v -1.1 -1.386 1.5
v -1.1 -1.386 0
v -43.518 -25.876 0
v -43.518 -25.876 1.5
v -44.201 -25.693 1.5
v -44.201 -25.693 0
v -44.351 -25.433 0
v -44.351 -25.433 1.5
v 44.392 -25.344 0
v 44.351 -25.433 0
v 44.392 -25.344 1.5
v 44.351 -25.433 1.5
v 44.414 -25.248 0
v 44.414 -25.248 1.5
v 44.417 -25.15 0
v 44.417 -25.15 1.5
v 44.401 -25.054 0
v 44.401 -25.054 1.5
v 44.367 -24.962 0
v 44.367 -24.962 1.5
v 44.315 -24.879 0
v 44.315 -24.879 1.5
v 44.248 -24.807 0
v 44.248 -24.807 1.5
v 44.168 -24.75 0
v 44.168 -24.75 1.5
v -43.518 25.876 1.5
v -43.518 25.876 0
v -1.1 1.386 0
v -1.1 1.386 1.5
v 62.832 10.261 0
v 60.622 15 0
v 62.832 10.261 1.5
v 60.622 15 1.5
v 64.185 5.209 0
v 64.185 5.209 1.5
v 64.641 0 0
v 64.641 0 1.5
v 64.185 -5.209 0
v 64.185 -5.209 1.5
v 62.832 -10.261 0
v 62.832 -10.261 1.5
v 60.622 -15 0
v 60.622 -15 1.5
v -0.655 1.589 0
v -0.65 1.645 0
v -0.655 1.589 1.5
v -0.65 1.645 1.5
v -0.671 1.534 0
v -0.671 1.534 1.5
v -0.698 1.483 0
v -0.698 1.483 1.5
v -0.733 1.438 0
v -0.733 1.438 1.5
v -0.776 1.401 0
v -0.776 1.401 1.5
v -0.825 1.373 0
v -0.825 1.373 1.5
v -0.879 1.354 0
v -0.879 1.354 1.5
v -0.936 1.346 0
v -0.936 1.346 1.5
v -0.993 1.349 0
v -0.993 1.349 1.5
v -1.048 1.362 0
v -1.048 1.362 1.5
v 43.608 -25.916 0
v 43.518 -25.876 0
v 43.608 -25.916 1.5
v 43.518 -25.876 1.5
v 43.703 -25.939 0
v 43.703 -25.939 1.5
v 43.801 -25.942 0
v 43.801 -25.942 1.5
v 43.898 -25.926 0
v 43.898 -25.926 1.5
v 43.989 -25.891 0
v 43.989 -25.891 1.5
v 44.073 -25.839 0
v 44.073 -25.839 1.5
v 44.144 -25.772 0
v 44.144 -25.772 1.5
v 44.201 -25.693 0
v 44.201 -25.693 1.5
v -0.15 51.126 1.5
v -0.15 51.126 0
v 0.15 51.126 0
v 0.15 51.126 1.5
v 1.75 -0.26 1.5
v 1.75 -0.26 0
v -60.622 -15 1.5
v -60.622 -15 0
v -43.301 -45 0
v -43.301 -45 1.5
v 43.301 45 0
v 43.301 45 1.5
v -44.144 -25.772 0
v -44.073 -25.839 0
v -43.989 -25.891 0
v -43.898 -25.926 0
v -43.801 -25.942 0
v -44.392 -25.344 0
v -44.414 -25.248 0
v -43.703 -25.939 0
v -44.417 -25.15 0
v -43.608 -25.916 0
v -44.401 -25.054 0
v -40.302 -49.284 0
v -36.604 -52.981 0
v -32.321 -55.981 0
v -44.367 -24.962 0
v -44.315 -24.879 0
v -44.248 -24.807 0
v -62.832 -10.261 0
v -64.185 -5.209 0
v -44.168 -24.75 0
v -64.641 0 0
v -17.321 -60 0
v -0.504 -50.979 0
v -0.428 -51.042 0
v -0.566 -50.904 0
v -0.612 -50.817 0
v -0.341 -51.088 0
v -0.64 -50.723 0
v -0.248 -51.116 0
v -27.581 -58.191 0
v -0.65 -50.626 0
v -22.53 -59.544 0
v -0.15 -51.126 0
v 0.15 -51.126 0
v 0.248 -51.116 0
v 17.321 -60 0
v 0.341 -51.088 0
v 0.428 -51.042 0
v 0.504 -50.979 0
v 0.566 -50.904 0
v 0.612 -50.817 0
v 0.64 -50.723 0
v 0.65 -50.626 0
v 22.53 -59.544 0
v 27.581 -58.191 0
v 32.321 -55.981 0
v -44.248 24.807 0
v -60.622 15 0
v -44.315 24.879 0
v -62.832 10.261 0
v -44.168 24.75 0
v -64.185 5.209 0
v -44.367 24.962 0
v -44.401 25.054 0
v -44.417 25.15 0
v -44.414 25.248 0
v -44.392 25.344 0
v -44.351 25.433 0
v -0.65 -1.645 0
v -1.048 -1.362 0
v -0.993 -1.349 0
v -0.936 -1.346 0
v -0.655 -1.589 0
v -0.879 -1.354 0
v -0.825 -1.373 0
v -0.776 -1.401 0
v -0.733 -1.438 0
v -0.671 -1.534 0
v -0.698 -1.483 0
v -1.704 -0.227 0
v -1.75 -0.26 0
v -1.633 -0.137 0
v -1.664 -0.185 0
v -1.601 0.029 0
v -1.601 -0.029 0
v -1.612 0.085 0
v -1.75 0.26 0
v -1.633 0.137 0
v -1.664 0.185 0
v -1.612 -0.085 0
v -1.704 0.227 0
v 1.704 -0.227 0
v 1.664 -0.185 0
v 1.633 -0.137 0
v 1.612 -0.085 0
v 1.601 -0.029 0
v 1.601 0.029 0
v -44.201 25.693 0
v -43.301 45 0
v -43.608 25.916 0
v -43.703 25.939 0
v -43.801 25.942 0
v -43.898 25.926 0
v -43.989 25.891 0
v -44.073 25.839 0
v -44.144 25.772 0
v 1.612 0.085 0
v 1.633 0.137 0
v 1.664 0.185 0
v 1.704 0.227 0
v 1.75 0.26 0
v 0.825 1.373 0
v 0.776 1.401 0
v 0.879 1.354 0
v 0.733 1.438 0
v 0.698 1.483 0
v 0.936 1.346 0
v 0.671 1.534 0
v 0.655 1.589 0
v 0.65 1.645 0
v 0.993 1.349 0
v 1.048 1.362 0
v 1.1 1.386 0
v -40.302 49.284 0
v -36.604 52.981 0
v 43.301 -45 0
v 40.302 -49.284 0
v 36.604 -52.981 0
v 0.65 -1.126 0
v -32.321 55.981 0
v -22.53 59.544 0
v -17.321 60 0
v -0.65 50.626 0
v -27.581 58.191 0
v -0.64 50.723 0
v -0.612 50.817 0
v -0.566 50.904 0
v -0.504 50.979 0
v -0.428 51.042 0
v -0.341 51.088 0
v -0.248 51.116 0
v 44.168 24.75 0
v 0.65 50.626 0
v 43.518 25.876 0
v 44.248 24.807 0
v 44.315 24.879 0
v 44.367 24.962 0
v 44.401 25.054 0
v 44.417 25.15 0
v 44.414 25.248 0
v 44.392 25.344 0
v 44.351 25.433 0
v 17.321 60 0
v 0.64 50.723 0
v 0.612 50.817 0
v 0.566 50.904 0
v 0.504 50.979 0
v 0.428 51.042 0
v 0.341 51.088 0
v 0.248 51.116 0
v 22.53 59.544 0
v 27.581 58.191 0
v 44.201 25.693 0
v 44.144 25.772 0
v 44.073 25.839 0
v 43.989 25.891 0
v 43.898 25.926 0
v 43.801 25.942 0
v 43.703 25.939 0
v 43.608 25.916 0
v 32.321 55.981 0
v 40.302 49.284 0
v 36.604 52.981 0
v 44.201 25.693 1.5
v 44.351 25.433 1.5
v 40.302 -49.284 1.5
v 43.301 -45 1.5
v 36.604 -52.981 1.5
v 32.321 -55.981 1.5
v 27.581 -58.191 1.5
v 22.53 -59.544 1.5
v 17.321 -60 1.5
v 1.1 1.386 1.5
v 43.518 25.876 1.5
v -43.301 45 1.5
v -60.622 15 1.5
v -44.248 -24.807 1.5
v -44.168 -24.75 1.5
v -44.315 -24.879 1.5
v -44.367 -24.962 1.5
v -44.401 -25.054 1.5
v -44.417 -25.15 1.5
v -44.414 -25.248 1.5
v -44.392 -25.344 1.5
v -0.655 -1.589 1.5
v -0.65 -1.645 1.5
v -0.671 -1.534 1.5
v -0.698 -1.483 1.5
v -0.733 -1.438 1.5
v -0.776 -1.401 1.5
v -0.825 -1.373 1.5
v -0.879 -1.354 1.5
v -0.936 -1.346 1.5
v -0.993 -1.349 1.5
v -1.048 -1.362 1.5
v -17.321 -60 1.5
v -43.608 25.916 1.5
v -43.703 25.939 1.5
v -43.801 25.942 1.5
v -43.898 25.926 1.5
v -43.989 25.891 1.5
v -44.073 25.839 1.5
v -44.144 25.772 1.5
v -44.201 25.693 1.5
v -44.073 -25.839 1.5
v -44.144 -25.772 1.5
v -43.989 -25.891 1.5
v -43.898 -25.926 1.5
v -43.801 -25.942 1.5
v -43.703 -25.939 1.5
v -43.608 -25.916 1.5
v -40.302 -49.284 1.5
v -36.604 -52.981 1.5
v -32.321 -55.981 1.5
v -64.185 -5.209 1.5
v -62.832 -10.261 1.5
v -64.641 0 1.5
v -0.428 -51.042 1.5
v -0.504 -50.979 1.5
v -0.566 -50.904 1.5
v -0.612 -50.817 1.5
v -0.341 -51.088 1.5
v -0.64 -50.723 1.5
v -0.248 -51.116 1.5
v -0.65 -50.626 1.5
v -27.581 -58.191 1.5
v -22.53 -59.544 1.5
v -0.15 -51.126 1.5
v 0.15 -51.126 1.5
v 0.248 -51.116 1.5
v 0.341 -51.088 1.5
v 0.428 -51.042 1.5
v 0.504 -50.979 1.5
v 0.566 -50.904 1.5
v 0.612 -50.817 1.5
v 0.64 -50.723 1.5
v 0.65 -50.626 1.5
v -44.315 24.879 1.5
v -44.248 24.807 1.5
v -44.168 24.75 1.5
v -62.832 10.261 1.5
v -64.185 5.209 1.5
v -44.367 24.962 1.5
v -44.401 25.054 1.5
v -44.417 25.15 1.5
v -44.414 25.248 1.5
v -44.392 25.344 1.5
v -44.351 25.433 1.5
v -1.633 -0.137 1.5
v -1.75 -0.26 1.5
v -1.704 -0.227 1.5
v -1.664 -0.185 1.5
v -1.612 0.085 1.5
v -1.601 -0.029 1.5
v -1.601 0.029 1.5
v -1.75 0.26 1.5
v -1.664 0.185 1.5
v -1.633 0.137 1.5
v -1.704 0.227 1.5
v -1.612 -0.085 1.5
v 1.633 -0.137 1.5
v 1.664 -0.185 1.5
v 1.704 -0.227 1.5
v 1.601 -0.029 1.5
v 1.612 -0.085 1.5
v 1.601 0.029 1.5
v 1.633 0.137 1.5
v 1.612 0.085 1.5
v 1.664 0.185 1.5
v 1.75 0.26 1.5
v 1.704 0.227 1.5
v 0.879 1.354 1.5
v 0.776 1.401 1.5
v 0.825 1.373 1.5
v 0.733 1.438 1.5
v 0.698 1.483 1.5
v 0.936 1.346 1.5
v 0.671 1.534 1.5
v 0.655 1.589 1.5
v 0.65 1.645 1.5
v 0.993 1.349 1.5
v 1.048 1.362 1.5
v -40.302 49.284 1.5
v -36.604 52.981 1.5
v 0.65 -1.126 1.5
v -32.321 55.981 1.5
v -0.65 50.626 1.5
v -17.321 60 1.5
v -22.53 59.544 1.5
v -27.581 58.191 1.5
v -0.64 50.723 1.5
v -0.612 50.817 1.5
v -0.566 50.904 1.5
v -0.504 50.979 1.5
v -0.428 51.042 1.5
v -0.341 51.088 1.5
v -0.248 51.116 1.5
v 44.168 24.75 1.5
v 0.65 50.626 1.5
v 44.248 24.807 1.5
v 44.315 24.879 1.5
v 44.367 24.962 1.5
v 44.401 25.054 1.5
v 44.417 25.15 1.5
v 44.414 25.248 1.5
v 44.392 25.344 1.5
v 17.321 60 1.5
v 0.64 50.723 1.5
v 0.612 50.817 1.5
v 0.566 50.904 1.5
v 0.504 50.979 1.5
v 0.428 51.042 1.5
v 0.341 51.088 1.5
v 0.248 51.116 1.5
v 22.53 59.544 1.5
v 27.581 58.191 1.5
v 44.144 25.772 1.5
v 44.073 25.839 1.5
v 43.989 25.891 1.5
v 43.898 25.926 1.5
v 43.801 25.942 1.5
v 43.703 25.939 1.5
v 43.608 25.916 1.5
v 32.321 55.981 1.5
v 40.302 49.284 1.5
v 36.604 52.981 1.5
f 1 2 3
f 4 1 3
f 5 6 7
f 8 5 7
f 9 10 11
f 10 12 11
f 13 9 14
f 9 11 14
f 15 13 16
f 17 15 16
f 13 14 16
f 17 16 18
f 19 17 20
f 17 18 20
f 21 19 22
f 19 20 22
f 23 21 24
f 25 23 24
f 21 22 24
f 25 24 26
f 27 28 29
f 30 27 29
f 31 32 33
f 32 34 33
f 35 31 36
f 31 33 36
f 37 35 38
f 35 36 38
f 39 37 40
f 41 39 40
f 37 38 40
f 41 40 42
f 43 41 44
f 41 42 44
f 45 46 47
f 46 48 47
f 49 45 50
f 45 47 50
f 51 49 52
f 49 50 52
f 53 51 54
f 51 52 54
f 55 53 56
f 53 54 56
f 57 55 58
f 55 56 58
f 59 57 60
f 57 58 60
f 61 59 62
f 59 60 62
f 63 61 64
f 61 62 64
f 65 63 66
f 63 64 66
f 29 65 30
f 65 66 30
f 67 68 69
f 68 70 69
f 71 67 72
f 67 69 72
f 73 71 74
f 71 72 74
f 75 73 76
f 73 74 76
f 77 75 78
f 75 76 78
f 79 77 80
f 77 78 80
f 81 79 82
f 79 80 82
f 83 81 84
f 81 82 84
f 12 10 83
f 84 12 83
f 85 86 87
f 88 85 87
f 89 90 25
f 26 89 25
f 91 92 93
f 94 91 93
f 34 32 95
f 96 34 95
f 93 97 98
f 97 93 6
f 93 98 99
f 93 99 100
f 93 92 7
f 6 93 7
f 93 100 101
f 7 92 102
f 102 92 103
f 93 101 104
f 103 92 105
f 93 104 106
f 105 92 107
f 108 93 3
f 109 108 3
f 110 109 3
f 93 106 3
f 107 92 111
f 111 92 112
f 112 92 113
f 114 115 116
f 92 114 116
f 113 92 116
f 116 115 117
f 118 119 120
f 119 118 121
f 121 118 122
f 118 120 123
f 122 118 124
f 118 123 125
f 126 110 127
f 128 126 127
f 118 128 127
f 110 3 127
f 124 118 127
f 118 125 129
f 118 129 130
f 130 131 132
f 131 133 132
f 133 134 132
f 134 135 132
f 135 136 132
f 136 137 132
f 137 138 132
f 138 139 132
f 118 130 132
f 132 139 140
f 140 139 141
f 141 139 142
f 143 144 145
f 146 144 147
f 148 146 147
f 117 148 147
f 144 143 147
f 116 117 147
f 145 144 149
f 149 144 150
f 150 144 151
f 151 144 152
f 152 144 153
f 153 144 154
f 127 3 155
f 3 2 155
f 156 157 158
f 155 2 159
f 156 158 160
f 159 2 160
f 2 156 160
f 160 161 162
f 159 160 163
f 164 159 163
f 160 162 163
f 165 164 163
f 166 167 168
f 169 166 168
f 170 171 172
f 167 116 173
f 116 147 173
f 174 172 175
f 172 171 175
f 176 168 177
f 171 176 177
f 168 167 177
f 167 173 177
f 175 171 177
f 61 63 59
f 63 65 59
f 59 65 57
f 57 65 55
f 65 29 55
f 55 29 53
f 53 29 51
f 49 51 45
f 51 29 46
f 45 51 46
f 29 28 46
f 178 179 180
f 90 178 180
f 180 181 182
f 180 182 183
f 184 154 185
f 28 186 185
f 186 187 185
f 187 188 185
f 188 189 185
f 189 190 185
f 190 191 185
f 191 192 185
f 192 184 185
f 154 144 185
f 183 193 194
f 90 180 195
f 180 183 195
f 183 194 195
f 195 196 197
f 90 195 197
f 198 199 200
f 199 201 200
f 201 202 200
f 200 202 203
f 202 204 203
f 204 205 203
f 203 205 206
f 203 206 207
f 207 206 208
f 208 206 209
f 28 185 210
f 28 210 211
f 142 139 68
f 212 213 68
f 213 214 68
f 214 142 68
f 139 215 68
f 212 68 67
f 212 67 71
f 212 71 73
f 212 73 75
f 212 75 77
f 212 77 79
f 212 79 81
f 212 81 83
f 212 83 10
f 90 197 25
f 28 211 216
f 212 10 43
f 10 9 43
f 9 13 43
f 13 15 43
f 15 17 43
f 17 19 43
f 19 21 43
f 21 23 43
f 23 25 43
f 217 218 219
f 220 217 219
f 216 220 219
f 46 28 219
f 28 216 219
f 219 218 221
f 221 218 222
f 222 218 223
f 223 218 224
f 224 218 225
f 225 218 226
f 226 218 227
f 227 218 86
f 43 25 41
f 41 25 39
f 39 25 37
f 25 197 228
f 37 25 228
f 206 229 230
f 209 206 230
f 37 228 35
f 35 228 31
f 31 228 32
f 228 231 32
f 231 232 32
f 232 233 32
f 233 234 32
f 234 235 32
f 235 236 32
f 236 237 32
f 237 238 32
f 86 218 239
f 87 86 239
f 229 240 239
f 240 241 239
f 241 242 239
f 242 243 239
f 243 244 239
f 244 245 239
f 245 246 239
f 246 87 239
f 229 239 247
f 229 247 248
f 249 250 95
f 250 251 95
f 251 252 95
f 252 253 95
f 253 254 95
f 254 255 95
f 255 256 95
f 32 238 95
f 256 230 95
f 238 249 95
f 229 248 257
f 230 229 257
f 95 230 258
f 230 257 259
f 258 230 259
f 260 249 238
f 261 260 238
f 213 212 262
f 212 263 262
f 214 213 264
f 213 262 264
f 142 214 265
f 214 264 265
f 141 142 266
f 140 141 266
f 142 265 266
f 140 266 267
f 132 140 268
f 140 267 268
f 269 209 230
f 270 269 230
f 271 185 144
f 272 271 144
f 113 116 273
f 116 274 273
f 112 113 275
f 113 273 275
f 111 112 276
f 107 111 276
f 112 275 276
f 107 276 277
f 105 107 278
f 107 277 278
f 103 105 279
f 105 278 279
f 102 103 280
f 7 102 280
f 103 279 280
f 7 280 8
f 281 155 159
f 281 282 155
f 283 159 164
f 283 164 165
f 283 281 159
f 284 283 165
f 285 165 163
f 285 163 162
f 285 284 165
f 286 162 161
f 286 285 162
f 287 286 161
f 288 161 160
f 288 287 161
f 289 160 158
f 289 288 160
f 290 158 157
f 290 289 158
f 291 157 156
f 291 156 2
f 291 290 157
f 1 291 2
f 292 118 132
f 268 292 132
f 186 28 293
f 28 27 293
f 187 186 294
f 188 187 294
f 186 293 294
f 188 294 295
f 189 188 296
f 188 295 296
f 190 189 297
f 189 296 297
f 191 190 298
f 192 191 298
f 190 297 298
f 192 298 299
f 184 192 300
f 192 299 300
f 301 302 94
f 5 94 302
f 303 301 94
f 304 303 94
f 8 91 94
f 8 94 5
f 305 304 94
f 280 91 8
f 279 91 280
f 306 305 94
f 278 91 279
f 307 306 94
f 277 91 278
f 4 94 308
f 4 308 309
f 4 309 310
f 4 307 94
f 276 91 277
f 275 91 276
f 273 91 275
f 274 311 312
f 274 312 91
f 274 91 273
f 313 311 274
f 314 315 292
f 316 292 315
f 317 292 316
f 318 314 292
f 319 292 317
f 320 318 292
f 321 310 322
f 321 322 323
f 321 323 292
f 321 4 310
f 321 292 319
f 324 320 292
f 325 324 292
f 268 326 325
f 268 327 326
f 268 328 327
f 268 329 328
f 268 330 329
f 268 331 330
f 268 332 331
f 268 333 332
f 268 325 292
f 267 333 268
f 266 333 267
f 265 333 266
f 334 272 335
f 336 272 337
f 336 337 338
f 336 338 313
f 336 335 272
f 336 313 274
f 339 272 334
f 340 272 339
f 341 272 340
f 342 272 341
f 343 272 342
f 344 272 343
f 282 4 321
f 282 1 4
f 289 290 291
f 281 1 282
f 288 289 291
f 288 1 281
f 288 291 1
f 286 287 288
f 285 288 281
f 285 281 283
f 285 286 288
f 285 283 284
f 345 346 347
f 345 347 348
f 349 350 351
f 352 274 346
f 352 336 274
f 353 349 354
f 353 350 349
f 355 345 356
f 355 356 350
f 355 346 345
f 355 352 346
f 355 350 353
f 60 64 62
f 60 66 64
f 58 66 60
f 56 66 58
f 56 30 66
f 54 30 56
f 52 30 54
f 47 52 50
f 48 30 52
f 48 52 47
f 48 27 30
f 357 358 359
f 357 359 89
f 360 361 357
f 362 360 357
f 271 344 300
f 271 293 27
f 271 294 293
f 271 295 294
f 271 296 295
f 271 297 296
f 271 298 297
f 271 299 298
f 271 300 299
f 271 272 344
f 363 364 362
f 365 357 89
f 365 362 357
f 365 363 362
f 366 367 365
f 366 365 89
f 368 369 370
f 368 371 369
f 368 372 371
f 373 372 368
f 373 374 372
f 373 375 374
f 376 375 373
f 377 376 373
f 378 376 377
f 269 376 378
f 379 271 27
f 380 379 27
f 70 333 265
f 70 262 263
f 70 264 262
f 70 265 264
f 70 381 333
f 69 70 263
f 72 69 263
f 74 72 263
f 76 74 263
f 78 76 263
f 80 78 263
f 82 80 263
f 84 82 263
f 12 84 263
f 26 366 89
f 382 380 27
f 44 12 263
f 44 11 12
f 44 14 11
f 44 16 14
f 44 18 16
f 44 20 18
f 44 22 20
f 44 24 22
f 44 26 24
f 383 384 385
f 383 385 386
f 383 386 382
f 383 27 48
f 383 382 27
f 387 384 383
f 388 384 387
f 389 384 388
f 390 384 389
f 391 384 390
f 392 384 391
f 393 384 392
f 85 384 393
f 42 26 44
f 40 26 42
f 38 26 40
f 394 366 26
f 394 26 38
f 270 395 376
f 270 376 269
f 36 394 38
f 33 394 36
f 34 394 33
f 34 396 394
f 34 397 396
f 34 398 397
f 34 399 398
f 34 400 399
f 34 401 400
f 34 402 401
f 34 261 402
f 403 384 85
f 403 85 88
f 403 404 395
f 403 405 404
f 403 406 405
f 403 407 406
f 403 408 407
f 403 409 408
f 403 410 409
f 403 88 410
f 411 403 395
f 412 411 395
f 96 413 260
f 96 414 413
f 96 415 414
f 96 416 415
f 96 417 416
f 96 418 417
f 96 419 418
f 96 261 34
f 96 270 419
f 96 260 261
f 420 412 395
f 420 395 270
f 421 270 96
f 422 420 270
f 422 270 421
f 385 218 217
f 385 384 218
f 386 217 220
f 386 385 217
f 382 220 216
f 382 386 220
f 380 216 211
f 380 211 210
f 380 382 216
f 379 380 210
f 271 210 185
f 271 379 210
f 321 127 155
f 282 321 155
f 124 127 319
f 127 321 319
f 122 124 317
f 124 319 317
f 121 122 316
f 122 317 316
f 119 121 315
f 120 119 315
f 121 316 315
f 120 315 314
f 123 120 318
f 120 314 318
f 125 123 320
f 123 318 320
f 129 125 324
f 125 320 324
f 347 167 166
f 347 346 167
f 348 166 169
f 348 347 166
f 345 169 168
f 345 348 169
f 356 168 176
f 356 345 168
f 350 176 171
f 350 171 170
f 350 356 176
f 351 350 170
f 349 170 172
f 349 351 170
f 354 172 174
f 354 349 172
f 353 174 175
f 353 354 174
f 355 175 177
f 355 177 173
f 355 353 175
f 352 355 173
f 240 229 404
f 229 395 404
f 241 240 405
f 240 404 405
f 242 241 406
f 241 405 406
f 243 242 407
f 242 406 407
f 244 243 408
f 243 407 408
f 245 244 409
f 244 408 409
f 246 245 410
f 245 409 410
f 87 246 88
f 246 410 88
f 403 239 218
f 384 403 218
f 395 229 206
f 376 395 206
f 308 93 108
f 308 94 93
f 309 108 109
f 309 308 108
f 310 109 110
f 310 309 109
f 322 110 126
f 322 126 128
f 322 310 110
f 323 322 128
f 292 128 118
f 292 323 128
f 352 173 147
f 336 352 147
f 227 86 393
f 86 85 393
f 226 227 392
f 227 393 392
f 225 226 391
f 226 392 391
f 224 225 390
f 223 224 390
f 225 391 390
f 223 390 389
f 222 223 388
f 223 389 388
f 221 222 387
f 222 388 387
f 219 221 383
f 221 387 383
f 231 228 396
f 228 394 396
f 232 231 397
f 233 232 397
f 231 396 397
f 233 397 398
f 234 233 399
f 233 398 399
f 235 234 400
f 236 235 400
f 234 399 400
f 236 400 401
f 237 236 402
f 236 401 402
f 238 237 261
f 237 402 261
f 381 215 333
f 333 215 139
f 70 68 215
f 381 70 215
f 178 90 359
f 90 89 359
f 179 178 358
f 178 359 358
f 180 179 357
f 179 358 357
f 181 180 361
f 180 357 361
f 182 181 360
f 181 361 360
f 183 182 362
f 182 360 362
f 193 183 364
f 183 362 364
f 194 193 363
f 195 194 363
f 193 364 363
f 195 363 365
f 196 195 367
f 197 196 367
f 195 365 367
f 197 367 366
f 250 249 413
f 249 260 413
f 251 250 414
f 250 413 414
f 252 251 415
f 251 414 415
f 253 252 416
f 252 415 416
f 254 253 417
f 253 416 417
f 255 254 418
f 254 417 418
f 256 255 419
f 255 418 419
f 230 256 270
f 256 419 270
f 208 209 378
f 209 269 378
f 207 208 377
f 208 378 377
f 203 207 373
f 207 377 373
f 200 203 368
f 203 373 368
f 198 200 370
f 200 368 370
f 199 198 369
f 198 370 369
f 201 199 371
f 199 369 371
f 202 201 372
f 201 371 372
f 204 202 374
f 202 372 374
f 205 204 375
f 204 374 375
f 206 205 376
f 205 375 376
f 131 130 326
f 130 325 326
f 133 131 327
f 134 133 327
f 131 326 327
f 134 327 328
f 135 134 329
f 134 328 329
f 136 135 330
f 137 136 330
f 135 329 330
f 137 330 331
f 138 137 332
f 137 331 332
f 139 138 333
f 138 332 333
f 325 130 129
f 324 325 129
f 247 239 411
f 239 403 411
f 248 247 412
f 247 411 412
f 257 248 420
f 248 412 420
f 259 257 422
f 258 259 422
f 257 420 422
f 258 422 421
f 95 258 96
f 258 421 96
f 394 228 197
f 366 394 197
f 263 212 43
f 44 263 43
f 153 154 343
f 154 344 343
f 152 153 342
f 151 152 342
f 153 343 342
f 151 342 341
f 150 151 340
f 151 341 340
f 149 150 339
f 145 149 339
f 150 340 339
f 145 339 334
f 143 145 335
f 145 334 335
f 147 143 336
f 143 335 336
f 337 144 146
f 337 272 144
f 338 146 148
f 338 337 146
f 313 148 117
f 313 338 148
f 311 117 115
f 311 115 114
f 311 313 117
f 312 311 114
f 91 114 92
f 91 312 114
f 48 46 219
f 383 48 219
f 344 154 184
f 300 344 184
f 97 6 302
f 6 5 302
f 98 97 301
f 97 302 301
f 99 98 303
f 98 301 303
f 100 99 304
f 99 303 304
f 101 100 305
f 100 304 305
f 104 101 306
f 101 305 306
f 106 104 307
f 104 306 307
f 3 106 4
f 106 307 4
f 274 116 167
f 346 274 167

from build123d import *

# Parameters (mm, degrees)
F1_DEPTH = 1.5
F2_R     = 30
F3_R     = 0.5
F4_R     = 0.3


with BuildPart() as f1:
    # F0 (on Top) → F1 (new body)
    with BuildSketch(Plane.XY):
        Polygon((34.641016, 60), (-34.641016, 60), (-69.282032, 0), (-34.641016, -60), (34.641016, -60), (69.282032, 0), align=None)
        Polygon((0.65, -1.125833), (0.65, -51.125833), (-0.65, -51.125833), (-0.65, -1.125833), (-43.95127, -26.125833), (-44.60127, -25), (-1.3, 0), (-44.60127, 25), (-43.95127, 26.125833), (-0.65, 1.125833), (-0.65, 51.125833), (0.65, 51.125833), (0.65, 1.125833), (43.95127, 26.125833), (44.60127, 25), (1.3, 0), (44.60127, -25), (43.95127, -26.125833), align=None, mode=Mode.SUBTRACT)
    extrude(amount=F1_DEPTH)

    # F2
    f2_edges = [f1.edges().sort_by_distance(p)[0] for p in [
        (34.641016, 60, 0.75),
        (69.282032, 0, 0.75),
        (34.641016, -60, 0.75),
        (-34.641016, -60, 0.75),
        (-69.282032, 0, 0.75),
        (-34.641016, 60, 0.75),
    ]]
    fillet(f2_edges, radius=F2_R)

    # F3
    f3_edges = [f1.edges().sort_by_distance(p)[0] for p in [
        (43.95127, -26.125833, 0.75),
        (44.60127, -25, 0.75),
        (43.95127, 26.125833, 0.75),
        (44.60127, 25, 0.75),
        (-0.65, 51.125833, 0.75),
        (0.65, 51.125833, 0.75),
        (-44.60127, 25, 0.75),
        (-43.95127, 26.125833, 0.75),
        (-43.95127, -26.125833, 0.75),
        (-44.60127, -25, 0.75),
        (-0.65, -51.125833, 0.75),
        (0.65, -51.125833, 0.75),
    ]]
    fillet(f3_edges, radius=F3_R)

    # F4
    f4_edges = [f1.edges().sort_by_distance(p)[0] for p in [
        (-0.65, 1.125833, 0.75),
        (-1.3, 0, 0.75),
        (-0.65, -1.125833, 0.75),
        (0.65, 1.125833, 0.75),
        (1.3, 0, 0.75),
    ]]
    fillet(f4_edges, radius=F4_R)


solid = f1.part
